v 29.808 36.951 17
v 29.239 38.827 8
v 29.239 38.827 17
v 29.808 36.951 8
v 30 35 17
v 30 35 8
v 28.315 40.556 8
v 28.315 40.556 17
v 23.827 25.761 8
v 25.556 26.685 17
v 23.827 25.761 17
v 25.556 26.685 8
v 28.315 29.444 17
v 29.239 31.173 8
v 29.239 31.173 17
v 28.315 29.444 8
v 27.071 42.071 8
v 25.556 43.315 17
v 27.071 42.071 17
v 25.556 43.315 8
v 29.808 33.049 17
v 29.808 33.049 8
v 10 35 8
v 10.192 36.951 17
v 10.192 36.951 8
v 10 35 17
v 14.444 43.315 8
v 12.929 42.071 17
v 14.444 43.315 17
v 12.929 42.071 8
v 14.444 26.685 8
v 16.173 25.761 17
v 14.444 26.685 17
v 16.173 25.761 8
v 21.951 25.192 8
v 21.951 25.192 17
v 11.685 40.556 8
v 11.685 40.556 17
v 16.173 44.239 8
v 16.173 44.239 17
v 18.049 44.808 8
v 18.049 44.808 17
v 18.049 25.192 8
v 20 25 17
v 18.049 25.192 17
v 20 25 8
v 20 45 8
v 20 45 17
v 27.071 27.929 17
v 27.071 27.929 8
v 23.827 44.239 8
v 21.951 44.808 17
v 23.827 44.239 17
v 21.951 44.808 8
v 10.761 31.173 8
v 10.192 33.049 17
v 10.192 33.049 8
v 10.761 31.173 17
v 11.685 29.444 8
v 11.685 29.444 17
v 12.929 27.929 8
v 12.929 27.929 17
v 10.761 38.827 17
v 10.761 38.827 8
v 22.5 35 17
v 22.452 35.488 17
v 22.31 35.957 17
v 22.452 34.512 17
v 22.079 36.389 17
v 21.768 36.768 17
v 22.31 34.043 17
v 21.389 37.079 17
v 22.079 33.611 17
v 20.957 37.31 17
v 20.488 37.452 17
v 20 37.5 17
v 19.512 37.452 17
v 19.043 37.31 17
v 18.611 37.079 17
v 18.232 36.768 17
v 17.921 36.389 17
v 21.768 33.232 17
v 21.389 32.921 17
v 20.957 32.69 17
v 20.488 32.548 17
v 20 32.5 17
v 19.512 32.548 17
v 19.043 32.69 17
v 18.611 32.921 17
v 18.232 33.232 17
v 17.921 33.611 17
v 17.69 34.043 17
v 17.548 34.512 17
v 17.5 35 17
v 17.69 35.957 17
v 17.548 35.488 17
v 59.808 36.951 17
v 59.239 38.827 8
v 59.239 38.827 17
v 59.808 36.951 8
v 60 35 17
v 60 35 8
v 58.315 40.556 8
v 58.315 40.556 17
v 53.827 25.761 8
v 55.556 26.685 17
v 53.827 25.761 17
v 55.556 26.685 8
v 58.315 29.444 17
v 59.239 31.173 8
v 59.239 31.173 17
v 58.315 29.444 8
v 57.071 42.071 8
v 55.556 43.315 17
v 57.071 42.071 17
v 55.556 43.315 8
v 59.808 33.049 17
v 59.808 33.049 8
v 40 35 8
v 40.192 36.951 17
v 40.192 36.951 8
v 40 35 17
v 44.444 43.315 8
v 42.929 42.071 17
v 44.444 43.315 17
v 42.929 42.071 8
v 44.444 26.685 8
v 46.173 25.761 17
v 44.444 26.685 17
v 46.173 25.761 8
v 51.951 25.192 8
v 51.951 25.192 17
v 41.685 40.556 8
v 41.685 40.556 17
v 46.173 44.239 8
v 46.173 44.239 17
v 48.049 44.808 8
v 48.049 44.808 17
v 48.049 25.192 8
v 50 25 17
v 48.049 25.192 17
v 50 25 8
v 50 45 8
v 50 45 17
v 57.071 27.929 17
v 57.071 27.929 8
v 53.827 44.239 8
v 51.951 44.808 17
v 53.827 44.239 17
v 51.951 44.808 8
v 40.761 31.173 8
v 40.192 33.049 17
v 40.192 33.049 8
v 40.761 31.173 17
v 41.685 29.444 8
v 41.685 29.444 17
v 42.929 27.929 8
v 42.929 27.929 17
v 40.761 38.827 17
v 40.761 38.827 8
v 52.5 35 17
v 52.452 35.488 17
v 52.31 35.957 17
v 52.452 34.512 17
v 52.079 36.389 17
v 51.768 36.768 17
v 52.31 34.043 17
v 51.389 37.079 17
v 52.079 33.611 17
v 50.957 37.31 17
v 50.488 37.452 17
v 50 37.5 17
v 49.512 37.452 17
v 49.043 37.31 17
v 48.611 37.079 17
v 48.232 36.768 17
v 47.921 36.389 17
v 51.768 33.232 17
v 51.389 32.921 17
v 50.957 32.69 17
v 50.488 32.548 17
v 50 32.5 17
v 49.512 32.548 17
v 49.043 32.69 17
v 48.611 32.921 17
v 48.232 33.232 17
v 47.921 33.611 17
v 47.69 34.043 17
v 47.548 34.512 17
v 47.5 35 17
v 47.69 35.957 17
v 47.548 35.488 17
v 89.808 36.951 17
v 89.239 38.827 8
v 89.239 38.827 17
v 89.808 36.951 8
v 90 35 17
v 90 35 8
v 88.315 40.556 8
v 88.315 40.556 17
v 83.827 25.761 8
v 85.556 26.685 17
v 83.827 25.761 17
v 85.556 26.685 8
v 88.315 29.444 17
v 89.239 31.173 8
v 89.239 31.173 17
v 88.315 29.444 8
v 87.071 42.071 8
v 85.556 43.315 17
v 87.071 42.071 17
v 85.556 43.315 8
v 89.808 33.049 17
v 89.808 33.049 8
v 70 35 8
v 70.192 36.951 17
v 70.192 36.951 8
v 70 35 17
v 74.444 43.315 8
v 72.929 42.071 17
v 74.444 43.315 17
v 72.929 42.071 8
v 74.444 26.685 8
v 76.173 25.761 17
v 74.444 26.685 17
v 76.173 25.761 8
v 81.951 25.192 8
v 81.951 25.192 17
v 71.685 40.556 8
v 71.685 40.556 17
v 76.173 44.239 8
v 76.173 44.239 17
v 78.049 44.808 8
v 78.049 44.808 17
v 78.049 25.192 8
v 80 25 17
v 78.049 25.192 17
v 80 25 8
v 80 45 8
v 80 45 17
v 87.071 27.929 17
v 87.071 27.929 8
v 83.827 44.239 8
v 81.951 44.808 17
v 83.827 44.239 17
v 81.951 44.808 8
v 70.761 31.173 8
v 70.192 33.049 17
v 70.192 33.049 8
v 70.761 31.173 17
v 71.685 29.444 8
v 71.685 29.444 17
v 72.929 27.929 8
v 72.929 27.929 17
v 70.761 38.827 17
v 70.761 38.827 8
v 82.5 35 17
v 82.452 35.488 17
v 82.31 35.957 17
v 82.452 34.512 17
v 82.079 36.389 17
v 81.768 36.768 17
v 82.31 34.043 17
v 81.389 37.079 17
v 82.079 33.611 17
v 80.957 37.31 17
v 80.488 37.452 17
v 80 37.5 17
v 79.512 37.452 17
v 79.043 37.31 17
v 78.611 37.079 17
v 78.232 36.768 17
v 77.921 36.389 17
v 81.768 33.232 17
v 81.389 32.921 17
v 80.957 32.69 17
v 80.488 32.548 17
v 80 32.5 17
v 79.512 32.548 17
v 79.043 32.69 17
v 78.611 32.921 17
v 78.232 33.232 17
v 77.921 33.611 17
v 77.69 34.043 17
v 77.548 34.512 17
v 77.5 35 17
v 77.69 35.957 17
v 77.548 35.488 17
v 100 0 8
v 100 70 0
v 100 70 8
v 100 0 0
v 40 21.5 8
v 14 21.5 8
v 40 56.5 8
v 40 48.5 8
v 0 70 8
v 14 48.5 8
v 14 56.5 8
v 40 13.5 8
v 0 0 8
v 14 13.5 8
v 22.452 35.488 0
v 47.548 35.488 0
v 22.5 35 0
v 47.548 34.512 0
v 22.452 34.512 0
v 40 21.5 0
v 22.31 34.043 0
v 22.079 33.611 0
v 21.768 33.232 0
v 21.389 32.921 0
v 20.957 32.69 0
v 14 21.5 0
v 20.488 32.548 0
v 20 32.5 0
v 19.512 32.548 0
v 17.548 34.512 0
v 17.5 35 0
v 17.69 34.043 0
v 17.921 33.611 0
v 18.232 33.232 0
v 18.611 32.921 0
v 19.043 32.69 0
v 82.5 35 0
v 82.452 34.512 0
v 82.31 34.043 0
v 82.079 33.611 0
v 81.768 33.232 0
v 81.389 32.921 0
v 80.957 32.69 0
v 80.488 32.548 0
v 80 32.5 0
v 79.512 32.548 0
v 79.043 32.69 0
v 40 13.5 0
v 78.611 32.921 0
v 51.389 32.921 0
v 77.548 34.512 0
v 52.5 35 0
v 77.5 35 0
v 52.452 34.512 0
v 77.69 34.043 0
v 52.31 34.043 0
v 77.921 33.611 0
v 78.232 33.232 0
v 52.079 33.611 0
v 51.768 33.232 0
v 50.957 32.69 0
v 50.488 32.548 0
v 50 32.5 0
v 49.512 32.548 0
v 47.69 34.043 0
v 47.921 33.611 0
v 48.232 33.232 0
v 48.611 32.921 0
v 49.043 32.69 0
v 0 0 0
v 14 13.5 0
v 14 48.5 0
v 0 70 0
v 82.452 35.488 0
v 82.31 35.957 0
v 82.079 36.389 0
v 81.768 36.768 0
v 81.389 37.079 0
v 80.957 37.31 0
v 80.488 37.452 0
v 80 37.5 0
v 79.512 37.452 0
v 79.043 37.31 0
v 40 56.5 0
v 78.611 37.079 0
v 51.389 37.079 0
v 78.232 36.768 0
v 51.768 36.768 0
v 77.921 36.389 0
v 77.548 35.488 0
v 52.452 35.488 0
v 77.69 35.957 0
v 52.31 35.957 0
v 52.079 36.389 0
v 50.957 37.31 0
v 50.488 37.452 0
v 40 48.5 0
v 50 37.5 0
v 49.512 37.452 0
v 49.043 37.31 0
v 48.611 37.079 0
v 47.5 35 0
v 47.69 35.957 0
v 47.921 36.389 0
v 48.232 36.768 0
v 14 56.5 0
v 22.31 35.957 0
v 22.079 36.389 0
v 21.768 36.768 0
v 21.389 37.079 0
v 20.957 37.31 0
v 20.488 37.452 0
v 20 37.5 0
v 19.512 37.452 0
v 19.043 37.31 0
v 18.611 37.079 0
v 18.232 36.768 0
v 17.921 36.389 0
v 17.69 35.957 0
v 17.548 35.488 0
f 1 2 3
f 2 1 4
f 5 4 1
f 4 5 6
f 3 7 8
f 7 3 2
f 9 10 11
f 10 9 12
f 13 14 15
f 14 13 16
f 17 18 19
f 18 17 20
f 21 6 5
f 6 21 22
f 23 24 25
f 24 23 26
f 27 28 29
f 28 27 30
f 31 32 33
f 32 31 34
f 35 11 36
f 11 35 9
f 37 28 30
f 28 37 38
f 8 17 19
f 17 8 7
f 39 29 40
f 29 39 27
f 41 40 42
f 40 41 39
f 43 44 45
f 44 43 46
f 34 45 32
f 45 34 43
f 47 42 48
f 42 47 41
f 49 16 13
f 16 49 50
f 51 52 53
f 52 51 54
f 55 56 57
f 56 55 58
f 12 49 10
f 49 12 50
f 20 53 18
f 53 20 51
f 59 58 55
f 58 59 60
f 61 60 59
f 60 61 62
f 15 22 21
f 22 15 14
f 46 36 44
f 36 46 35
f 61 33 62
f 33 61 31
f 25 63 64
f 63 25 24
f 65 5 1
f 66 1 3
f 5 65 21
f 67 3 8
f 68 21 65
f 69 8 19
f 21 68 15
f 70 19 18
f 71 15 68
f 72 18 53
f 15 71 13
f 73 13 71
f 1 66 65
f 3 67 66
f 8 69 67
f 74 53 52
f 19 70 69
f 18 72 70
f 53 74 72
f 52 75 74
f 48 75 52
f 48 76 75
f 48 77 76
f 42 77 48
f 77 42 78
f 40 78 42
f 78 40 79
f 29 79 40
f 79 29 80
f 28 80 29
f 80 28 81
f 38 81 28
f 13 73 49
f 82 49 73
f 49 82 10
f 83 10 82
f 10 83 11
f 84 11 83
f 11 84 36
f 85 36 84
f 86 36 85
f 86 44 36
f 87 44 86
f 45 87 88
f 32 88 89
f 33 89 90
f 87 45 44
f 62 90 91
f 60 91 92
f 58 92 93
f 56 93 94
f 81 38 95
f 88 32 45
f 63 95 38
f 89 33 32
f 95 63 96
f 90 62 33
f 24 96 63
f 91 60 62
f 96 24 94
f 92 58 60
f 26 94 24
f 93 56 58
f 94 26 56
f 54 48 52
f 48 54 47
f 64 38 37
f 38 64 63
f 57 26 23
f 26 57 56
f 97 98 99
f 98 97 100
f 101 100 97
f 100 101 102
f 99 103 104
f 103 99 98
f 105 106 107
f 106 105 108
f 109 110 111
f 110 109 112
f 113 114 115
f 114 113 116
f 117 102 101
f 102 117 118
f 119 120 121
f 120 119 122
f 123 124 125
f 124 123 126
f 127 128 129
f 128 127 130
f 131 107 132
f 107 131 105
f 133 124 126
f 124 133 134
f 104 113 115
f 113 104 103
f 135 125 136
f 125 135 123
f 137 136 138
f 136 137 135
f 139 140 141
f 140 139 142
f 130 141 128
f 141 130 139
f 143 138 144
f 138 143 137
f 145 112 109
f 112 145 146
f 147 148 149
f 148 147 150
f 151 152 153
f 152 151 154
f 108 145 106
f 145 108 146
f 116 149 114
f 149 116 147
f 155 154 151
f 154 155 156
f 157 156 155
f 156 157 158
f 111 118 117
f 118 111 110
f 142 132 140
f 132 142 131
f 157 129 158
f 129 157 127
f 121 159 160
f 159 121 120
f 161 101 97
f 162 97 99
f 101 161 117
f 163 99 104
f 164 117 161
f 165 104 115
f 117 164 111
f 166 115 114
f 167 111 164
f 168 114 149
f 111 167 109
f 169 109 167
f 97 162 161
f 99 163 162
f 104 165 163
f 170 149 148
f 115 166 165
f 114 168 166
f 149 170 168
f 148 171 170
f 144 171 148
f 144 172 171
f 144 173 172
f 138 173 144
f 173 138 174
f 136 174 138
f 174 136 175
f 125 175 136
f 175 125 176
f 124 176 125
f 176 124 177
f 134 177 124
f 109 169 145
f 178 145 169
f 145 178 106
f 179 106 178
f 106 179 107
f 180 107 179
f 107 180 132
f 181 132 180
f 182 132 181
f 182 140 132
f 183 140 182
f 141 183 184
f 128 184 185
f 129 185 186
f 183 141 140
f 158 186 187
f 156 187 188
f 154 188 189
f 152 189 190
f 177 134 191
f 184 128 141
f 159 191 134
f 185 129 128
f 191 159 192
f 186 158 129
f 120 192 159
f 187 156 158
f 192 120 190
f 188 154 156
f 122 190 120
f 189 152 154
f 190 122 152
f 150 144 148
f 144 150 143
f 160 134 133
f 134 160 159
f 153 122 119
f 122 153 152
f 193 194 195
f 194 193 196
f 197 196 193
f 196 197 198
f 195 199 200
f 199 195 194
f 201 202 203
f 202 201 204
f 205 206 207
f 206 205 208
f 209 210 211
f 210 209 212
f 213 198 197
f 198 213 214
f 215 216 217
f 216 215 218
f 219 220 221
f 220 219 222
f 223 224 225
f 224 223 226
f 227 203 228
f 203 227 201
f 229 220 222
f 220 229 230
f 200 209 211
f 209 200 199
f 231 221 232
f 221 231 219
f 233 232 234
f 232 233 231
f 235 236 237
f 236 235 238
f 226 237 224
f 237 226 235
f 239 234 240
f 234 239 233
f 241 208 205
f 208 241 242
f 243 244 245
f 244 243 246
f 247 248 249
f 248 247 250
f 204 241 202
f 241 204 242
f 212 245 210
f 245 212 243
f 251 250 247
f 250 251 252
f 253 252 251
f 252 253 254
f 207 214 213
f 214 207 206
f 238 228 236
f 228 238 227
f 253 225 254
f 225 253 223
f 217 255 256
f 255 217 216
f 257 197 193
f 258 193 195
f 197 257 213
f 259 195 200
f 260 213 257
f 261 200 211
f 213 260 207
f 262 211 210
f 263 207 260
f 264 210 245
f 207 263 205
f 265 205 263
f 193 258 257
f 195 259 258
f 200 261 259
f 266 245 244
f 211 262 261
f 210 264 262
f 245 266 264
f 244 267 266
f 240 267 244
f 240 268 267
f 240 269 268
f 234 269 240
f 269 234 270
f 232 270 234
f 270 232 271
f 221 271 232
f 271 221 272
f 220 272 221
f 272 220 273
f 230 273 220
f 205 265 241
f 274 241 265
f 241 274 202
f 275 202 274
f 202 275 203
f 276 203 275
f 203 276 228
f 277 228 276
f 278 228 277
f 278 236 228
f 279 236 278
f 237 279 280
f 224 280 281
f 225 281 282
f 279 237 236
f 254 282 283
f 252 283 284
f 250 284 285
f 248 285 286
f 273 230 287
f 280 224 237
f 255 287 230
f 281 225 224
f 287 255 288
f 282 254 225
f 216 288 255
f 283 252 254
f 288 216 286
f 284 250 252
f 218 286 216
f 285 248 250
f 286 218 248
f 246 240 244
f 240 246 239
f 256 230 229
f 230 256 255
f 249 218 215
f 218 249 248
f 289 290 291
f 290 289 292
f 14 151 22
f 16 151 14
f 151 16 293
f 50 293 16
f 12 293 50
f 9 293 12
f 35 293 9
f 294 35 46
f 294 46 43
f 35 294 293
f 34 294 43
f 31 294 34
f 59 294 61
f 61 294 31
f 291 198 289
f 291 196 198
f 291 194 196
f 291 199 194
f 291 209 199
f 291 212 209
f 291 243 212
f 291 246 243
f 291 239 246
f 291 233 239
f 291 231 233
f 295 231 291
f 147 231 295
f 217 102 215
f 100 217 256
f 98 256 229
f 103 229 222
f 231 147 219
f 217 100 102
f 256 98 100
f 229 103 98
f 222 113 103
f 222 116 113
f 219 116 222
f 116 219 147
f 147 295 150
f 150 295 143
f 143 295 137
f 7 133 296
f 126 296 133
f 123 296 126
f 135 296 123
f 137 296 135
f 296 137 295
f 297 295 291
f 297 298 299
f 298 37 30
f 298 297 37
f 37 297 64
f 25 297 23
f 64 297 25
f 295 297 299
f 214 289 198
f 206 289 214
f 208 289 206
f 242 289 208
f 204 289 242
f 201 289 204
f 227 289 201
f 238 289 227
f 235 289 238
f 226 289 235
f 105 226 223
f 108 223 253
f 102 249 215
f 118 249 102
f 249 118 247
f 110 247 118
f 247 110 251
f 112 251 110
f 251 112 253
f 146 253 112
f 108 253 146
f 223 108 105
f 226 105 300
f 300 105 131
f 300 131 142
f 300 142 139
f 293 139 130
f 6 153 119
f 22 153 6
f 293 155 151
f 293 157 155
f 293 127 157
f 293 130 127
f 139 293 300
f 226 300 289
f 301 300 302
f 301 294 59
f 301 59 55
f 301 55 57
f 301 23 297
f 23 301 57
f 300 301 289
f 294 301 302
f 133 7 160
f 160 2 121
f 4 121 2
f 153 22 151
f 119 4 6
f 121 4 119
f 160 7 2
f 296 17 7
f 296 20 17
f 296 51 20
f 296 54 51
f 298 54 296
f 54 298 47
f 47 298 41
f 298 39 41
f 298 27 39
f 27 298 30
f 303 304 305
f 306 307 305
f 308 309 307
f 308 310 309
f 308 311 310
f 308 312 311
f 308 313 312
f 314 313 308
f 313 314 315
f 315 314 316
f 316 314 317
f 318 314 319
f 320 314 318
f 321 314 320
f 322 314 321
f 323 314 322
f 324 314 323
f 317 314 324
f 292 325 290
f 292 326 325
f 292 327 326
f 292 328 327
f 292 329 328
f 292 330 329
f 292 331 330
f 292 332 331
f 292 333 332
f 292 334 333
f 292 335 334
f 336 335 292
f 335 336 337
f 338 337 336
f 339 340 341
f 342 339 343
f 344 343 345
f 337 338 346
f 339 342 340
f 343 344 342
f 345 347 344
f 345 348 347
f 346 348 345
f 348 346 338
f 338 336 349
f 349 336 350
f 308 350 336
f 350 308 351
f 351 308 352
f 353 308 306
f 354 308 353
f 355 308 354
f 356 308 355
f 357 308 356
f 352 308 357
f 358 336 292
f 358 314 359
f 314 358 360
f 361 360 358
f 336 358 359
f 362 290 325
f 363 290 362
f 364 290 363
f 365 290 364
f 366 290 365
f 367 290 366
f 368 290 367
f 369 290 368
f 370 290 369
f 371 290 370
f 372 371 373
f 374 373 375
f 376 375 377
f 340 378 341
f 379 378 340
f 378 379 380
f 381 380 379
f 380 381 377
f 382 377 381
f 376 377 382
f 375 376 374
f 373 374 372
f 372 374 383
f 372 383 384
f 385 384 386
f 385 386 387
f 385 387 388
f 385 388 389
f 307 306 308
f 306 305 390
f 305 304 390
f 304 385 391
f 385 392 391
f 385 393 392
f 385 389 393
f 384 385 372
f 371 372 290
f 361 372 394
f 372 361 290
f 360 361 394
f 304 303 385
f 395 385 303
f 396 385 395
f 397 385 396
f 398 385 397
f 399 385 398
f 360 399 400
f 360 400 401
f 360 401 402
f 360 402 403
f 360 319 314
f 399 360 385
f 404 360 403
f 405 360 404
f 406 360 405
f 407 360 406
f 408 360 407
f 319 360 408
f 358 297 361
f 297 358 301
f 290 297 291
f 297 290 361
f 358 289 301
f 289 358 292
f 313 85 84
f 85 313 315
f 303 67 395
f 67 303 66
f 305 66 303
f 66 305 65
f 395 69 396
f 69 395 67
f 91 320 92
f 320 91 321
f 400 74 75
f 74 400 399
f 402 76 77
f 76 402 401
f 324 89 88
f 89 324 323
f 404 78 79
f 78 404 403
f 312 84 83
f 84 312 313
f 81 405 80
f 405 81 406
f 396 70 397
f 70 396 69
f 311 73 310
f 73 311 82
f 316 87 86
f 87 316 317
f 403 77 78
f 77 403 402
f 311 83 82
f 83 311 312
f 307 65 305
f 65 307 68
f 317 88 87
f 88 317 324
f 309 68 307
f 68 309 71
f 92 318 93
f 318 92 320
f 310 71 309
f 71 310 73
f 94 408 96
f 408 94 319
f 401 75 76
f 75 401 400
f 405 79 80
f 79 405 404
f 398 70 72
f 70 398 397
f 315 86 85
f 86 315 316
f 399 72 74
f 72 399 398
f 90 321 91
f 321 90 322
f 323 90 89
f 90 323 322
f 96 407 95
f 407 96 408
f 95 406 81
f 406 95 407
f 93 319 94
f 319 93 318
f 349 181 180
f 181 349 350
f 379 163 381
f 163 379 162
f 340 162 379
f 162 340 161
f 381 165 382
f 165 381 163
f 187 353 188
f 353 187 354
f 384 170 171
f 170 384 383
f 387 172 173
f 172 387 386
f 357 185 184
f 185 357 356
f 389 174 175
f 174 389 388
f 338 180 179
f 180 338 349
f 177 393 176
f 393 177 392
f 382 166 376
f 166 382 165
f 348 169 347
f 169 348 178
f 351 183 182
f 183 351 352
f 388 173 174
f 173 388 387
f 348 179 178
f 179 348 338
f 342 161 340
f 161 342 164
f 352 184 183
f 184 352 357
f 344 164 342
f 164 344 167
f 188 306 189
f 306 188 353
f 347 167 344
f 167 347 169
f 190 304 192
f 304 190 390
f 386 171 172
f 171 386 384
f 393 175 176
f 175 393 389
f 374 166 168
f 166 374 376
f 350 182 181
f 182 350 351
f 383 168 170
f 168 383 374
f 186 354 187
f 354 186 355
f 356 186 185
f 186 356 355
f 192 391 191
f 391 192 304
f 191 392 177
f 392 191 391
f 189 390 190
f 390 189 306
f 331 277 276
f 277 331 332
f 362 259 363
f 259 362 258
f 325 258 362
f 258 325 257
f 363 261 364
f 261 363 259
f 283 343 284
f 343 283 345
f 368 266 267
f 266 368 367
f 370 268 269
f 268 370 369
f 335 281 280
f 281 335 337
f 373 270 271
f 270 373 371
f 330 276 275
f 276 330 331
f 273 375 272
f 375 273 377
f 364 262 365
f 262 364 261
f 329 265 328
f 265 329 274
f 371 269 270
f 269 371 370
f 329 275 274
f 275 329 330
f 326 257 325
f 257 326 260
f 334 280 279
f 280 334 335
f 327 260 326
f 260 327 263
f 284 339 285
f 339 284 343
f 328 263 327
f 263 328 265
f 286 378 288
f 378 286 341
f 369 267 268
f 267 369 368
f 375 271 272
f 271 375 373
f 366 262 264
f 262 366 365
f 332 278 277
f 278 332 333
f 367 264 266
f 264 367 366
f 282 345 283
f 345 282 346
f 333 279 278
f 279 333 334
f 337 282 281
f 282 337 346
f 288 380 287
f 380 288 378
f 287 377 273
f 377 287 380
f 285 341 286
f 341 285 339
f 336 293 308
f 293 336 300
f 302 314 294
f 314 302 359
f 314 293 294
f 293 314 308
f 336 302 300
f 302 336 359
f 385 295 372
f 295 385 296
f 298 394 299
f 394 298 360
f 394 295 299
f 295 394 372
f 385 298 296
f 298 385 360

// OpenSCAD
$fn = 32;

// ----------------------------------------------------------------------
// Drill jig: three_boss_slot jig
// ----------------------------------------------------------------------

// --- parameters (mm) ---
plate_l = 100;            // plate length, X
plate_w = 70;             // plate width, Y
plate_t = 8;              // plate thickness
boss_d = 20;              // guide boss diameter
boss_h = 10;              // boss height above the plate
guide_d = 5;              // guide hole diameter
boss_pitch = 30;          // boss pitch
slot_w = 8;               // clamp slot width
slot_l = 26;              // clamp slot length
slot_x = 14;              // slot start X

n_boss = 3;  // guide bosses
boss_x0 = (plate_l - (n_boss - 1) * boss_pitch) / 2;  // first boss X
boss_top = plate_t - 1 + boss_h;  // boss crown height
total_h = boss_top;  // overall height

difference() {
  union() {
  cube([plate_l, plate_w, plate_t]);
  for (i = [0 : n_boss - 1])
    translate([boss_x0 + i * boss_pitch, plate_w / 2, plate_t - 1])
      cylinder(h = boss_h, d = boss_d);
  }
  for (i = [0 : n_boss - 1])
    translate([boss_x0 + i * boss_pitch, plate_w / 2, -1])
      cylinder(h = plate_t + boss_h, d = guide_d);
  for (cy = [plate_w * 0.25, plate_w * 0.75])
    translate([slot_x, cy - slot_w / 2, -1])
      cube([slot_l, slot_w, plate_t + 2]);
}
